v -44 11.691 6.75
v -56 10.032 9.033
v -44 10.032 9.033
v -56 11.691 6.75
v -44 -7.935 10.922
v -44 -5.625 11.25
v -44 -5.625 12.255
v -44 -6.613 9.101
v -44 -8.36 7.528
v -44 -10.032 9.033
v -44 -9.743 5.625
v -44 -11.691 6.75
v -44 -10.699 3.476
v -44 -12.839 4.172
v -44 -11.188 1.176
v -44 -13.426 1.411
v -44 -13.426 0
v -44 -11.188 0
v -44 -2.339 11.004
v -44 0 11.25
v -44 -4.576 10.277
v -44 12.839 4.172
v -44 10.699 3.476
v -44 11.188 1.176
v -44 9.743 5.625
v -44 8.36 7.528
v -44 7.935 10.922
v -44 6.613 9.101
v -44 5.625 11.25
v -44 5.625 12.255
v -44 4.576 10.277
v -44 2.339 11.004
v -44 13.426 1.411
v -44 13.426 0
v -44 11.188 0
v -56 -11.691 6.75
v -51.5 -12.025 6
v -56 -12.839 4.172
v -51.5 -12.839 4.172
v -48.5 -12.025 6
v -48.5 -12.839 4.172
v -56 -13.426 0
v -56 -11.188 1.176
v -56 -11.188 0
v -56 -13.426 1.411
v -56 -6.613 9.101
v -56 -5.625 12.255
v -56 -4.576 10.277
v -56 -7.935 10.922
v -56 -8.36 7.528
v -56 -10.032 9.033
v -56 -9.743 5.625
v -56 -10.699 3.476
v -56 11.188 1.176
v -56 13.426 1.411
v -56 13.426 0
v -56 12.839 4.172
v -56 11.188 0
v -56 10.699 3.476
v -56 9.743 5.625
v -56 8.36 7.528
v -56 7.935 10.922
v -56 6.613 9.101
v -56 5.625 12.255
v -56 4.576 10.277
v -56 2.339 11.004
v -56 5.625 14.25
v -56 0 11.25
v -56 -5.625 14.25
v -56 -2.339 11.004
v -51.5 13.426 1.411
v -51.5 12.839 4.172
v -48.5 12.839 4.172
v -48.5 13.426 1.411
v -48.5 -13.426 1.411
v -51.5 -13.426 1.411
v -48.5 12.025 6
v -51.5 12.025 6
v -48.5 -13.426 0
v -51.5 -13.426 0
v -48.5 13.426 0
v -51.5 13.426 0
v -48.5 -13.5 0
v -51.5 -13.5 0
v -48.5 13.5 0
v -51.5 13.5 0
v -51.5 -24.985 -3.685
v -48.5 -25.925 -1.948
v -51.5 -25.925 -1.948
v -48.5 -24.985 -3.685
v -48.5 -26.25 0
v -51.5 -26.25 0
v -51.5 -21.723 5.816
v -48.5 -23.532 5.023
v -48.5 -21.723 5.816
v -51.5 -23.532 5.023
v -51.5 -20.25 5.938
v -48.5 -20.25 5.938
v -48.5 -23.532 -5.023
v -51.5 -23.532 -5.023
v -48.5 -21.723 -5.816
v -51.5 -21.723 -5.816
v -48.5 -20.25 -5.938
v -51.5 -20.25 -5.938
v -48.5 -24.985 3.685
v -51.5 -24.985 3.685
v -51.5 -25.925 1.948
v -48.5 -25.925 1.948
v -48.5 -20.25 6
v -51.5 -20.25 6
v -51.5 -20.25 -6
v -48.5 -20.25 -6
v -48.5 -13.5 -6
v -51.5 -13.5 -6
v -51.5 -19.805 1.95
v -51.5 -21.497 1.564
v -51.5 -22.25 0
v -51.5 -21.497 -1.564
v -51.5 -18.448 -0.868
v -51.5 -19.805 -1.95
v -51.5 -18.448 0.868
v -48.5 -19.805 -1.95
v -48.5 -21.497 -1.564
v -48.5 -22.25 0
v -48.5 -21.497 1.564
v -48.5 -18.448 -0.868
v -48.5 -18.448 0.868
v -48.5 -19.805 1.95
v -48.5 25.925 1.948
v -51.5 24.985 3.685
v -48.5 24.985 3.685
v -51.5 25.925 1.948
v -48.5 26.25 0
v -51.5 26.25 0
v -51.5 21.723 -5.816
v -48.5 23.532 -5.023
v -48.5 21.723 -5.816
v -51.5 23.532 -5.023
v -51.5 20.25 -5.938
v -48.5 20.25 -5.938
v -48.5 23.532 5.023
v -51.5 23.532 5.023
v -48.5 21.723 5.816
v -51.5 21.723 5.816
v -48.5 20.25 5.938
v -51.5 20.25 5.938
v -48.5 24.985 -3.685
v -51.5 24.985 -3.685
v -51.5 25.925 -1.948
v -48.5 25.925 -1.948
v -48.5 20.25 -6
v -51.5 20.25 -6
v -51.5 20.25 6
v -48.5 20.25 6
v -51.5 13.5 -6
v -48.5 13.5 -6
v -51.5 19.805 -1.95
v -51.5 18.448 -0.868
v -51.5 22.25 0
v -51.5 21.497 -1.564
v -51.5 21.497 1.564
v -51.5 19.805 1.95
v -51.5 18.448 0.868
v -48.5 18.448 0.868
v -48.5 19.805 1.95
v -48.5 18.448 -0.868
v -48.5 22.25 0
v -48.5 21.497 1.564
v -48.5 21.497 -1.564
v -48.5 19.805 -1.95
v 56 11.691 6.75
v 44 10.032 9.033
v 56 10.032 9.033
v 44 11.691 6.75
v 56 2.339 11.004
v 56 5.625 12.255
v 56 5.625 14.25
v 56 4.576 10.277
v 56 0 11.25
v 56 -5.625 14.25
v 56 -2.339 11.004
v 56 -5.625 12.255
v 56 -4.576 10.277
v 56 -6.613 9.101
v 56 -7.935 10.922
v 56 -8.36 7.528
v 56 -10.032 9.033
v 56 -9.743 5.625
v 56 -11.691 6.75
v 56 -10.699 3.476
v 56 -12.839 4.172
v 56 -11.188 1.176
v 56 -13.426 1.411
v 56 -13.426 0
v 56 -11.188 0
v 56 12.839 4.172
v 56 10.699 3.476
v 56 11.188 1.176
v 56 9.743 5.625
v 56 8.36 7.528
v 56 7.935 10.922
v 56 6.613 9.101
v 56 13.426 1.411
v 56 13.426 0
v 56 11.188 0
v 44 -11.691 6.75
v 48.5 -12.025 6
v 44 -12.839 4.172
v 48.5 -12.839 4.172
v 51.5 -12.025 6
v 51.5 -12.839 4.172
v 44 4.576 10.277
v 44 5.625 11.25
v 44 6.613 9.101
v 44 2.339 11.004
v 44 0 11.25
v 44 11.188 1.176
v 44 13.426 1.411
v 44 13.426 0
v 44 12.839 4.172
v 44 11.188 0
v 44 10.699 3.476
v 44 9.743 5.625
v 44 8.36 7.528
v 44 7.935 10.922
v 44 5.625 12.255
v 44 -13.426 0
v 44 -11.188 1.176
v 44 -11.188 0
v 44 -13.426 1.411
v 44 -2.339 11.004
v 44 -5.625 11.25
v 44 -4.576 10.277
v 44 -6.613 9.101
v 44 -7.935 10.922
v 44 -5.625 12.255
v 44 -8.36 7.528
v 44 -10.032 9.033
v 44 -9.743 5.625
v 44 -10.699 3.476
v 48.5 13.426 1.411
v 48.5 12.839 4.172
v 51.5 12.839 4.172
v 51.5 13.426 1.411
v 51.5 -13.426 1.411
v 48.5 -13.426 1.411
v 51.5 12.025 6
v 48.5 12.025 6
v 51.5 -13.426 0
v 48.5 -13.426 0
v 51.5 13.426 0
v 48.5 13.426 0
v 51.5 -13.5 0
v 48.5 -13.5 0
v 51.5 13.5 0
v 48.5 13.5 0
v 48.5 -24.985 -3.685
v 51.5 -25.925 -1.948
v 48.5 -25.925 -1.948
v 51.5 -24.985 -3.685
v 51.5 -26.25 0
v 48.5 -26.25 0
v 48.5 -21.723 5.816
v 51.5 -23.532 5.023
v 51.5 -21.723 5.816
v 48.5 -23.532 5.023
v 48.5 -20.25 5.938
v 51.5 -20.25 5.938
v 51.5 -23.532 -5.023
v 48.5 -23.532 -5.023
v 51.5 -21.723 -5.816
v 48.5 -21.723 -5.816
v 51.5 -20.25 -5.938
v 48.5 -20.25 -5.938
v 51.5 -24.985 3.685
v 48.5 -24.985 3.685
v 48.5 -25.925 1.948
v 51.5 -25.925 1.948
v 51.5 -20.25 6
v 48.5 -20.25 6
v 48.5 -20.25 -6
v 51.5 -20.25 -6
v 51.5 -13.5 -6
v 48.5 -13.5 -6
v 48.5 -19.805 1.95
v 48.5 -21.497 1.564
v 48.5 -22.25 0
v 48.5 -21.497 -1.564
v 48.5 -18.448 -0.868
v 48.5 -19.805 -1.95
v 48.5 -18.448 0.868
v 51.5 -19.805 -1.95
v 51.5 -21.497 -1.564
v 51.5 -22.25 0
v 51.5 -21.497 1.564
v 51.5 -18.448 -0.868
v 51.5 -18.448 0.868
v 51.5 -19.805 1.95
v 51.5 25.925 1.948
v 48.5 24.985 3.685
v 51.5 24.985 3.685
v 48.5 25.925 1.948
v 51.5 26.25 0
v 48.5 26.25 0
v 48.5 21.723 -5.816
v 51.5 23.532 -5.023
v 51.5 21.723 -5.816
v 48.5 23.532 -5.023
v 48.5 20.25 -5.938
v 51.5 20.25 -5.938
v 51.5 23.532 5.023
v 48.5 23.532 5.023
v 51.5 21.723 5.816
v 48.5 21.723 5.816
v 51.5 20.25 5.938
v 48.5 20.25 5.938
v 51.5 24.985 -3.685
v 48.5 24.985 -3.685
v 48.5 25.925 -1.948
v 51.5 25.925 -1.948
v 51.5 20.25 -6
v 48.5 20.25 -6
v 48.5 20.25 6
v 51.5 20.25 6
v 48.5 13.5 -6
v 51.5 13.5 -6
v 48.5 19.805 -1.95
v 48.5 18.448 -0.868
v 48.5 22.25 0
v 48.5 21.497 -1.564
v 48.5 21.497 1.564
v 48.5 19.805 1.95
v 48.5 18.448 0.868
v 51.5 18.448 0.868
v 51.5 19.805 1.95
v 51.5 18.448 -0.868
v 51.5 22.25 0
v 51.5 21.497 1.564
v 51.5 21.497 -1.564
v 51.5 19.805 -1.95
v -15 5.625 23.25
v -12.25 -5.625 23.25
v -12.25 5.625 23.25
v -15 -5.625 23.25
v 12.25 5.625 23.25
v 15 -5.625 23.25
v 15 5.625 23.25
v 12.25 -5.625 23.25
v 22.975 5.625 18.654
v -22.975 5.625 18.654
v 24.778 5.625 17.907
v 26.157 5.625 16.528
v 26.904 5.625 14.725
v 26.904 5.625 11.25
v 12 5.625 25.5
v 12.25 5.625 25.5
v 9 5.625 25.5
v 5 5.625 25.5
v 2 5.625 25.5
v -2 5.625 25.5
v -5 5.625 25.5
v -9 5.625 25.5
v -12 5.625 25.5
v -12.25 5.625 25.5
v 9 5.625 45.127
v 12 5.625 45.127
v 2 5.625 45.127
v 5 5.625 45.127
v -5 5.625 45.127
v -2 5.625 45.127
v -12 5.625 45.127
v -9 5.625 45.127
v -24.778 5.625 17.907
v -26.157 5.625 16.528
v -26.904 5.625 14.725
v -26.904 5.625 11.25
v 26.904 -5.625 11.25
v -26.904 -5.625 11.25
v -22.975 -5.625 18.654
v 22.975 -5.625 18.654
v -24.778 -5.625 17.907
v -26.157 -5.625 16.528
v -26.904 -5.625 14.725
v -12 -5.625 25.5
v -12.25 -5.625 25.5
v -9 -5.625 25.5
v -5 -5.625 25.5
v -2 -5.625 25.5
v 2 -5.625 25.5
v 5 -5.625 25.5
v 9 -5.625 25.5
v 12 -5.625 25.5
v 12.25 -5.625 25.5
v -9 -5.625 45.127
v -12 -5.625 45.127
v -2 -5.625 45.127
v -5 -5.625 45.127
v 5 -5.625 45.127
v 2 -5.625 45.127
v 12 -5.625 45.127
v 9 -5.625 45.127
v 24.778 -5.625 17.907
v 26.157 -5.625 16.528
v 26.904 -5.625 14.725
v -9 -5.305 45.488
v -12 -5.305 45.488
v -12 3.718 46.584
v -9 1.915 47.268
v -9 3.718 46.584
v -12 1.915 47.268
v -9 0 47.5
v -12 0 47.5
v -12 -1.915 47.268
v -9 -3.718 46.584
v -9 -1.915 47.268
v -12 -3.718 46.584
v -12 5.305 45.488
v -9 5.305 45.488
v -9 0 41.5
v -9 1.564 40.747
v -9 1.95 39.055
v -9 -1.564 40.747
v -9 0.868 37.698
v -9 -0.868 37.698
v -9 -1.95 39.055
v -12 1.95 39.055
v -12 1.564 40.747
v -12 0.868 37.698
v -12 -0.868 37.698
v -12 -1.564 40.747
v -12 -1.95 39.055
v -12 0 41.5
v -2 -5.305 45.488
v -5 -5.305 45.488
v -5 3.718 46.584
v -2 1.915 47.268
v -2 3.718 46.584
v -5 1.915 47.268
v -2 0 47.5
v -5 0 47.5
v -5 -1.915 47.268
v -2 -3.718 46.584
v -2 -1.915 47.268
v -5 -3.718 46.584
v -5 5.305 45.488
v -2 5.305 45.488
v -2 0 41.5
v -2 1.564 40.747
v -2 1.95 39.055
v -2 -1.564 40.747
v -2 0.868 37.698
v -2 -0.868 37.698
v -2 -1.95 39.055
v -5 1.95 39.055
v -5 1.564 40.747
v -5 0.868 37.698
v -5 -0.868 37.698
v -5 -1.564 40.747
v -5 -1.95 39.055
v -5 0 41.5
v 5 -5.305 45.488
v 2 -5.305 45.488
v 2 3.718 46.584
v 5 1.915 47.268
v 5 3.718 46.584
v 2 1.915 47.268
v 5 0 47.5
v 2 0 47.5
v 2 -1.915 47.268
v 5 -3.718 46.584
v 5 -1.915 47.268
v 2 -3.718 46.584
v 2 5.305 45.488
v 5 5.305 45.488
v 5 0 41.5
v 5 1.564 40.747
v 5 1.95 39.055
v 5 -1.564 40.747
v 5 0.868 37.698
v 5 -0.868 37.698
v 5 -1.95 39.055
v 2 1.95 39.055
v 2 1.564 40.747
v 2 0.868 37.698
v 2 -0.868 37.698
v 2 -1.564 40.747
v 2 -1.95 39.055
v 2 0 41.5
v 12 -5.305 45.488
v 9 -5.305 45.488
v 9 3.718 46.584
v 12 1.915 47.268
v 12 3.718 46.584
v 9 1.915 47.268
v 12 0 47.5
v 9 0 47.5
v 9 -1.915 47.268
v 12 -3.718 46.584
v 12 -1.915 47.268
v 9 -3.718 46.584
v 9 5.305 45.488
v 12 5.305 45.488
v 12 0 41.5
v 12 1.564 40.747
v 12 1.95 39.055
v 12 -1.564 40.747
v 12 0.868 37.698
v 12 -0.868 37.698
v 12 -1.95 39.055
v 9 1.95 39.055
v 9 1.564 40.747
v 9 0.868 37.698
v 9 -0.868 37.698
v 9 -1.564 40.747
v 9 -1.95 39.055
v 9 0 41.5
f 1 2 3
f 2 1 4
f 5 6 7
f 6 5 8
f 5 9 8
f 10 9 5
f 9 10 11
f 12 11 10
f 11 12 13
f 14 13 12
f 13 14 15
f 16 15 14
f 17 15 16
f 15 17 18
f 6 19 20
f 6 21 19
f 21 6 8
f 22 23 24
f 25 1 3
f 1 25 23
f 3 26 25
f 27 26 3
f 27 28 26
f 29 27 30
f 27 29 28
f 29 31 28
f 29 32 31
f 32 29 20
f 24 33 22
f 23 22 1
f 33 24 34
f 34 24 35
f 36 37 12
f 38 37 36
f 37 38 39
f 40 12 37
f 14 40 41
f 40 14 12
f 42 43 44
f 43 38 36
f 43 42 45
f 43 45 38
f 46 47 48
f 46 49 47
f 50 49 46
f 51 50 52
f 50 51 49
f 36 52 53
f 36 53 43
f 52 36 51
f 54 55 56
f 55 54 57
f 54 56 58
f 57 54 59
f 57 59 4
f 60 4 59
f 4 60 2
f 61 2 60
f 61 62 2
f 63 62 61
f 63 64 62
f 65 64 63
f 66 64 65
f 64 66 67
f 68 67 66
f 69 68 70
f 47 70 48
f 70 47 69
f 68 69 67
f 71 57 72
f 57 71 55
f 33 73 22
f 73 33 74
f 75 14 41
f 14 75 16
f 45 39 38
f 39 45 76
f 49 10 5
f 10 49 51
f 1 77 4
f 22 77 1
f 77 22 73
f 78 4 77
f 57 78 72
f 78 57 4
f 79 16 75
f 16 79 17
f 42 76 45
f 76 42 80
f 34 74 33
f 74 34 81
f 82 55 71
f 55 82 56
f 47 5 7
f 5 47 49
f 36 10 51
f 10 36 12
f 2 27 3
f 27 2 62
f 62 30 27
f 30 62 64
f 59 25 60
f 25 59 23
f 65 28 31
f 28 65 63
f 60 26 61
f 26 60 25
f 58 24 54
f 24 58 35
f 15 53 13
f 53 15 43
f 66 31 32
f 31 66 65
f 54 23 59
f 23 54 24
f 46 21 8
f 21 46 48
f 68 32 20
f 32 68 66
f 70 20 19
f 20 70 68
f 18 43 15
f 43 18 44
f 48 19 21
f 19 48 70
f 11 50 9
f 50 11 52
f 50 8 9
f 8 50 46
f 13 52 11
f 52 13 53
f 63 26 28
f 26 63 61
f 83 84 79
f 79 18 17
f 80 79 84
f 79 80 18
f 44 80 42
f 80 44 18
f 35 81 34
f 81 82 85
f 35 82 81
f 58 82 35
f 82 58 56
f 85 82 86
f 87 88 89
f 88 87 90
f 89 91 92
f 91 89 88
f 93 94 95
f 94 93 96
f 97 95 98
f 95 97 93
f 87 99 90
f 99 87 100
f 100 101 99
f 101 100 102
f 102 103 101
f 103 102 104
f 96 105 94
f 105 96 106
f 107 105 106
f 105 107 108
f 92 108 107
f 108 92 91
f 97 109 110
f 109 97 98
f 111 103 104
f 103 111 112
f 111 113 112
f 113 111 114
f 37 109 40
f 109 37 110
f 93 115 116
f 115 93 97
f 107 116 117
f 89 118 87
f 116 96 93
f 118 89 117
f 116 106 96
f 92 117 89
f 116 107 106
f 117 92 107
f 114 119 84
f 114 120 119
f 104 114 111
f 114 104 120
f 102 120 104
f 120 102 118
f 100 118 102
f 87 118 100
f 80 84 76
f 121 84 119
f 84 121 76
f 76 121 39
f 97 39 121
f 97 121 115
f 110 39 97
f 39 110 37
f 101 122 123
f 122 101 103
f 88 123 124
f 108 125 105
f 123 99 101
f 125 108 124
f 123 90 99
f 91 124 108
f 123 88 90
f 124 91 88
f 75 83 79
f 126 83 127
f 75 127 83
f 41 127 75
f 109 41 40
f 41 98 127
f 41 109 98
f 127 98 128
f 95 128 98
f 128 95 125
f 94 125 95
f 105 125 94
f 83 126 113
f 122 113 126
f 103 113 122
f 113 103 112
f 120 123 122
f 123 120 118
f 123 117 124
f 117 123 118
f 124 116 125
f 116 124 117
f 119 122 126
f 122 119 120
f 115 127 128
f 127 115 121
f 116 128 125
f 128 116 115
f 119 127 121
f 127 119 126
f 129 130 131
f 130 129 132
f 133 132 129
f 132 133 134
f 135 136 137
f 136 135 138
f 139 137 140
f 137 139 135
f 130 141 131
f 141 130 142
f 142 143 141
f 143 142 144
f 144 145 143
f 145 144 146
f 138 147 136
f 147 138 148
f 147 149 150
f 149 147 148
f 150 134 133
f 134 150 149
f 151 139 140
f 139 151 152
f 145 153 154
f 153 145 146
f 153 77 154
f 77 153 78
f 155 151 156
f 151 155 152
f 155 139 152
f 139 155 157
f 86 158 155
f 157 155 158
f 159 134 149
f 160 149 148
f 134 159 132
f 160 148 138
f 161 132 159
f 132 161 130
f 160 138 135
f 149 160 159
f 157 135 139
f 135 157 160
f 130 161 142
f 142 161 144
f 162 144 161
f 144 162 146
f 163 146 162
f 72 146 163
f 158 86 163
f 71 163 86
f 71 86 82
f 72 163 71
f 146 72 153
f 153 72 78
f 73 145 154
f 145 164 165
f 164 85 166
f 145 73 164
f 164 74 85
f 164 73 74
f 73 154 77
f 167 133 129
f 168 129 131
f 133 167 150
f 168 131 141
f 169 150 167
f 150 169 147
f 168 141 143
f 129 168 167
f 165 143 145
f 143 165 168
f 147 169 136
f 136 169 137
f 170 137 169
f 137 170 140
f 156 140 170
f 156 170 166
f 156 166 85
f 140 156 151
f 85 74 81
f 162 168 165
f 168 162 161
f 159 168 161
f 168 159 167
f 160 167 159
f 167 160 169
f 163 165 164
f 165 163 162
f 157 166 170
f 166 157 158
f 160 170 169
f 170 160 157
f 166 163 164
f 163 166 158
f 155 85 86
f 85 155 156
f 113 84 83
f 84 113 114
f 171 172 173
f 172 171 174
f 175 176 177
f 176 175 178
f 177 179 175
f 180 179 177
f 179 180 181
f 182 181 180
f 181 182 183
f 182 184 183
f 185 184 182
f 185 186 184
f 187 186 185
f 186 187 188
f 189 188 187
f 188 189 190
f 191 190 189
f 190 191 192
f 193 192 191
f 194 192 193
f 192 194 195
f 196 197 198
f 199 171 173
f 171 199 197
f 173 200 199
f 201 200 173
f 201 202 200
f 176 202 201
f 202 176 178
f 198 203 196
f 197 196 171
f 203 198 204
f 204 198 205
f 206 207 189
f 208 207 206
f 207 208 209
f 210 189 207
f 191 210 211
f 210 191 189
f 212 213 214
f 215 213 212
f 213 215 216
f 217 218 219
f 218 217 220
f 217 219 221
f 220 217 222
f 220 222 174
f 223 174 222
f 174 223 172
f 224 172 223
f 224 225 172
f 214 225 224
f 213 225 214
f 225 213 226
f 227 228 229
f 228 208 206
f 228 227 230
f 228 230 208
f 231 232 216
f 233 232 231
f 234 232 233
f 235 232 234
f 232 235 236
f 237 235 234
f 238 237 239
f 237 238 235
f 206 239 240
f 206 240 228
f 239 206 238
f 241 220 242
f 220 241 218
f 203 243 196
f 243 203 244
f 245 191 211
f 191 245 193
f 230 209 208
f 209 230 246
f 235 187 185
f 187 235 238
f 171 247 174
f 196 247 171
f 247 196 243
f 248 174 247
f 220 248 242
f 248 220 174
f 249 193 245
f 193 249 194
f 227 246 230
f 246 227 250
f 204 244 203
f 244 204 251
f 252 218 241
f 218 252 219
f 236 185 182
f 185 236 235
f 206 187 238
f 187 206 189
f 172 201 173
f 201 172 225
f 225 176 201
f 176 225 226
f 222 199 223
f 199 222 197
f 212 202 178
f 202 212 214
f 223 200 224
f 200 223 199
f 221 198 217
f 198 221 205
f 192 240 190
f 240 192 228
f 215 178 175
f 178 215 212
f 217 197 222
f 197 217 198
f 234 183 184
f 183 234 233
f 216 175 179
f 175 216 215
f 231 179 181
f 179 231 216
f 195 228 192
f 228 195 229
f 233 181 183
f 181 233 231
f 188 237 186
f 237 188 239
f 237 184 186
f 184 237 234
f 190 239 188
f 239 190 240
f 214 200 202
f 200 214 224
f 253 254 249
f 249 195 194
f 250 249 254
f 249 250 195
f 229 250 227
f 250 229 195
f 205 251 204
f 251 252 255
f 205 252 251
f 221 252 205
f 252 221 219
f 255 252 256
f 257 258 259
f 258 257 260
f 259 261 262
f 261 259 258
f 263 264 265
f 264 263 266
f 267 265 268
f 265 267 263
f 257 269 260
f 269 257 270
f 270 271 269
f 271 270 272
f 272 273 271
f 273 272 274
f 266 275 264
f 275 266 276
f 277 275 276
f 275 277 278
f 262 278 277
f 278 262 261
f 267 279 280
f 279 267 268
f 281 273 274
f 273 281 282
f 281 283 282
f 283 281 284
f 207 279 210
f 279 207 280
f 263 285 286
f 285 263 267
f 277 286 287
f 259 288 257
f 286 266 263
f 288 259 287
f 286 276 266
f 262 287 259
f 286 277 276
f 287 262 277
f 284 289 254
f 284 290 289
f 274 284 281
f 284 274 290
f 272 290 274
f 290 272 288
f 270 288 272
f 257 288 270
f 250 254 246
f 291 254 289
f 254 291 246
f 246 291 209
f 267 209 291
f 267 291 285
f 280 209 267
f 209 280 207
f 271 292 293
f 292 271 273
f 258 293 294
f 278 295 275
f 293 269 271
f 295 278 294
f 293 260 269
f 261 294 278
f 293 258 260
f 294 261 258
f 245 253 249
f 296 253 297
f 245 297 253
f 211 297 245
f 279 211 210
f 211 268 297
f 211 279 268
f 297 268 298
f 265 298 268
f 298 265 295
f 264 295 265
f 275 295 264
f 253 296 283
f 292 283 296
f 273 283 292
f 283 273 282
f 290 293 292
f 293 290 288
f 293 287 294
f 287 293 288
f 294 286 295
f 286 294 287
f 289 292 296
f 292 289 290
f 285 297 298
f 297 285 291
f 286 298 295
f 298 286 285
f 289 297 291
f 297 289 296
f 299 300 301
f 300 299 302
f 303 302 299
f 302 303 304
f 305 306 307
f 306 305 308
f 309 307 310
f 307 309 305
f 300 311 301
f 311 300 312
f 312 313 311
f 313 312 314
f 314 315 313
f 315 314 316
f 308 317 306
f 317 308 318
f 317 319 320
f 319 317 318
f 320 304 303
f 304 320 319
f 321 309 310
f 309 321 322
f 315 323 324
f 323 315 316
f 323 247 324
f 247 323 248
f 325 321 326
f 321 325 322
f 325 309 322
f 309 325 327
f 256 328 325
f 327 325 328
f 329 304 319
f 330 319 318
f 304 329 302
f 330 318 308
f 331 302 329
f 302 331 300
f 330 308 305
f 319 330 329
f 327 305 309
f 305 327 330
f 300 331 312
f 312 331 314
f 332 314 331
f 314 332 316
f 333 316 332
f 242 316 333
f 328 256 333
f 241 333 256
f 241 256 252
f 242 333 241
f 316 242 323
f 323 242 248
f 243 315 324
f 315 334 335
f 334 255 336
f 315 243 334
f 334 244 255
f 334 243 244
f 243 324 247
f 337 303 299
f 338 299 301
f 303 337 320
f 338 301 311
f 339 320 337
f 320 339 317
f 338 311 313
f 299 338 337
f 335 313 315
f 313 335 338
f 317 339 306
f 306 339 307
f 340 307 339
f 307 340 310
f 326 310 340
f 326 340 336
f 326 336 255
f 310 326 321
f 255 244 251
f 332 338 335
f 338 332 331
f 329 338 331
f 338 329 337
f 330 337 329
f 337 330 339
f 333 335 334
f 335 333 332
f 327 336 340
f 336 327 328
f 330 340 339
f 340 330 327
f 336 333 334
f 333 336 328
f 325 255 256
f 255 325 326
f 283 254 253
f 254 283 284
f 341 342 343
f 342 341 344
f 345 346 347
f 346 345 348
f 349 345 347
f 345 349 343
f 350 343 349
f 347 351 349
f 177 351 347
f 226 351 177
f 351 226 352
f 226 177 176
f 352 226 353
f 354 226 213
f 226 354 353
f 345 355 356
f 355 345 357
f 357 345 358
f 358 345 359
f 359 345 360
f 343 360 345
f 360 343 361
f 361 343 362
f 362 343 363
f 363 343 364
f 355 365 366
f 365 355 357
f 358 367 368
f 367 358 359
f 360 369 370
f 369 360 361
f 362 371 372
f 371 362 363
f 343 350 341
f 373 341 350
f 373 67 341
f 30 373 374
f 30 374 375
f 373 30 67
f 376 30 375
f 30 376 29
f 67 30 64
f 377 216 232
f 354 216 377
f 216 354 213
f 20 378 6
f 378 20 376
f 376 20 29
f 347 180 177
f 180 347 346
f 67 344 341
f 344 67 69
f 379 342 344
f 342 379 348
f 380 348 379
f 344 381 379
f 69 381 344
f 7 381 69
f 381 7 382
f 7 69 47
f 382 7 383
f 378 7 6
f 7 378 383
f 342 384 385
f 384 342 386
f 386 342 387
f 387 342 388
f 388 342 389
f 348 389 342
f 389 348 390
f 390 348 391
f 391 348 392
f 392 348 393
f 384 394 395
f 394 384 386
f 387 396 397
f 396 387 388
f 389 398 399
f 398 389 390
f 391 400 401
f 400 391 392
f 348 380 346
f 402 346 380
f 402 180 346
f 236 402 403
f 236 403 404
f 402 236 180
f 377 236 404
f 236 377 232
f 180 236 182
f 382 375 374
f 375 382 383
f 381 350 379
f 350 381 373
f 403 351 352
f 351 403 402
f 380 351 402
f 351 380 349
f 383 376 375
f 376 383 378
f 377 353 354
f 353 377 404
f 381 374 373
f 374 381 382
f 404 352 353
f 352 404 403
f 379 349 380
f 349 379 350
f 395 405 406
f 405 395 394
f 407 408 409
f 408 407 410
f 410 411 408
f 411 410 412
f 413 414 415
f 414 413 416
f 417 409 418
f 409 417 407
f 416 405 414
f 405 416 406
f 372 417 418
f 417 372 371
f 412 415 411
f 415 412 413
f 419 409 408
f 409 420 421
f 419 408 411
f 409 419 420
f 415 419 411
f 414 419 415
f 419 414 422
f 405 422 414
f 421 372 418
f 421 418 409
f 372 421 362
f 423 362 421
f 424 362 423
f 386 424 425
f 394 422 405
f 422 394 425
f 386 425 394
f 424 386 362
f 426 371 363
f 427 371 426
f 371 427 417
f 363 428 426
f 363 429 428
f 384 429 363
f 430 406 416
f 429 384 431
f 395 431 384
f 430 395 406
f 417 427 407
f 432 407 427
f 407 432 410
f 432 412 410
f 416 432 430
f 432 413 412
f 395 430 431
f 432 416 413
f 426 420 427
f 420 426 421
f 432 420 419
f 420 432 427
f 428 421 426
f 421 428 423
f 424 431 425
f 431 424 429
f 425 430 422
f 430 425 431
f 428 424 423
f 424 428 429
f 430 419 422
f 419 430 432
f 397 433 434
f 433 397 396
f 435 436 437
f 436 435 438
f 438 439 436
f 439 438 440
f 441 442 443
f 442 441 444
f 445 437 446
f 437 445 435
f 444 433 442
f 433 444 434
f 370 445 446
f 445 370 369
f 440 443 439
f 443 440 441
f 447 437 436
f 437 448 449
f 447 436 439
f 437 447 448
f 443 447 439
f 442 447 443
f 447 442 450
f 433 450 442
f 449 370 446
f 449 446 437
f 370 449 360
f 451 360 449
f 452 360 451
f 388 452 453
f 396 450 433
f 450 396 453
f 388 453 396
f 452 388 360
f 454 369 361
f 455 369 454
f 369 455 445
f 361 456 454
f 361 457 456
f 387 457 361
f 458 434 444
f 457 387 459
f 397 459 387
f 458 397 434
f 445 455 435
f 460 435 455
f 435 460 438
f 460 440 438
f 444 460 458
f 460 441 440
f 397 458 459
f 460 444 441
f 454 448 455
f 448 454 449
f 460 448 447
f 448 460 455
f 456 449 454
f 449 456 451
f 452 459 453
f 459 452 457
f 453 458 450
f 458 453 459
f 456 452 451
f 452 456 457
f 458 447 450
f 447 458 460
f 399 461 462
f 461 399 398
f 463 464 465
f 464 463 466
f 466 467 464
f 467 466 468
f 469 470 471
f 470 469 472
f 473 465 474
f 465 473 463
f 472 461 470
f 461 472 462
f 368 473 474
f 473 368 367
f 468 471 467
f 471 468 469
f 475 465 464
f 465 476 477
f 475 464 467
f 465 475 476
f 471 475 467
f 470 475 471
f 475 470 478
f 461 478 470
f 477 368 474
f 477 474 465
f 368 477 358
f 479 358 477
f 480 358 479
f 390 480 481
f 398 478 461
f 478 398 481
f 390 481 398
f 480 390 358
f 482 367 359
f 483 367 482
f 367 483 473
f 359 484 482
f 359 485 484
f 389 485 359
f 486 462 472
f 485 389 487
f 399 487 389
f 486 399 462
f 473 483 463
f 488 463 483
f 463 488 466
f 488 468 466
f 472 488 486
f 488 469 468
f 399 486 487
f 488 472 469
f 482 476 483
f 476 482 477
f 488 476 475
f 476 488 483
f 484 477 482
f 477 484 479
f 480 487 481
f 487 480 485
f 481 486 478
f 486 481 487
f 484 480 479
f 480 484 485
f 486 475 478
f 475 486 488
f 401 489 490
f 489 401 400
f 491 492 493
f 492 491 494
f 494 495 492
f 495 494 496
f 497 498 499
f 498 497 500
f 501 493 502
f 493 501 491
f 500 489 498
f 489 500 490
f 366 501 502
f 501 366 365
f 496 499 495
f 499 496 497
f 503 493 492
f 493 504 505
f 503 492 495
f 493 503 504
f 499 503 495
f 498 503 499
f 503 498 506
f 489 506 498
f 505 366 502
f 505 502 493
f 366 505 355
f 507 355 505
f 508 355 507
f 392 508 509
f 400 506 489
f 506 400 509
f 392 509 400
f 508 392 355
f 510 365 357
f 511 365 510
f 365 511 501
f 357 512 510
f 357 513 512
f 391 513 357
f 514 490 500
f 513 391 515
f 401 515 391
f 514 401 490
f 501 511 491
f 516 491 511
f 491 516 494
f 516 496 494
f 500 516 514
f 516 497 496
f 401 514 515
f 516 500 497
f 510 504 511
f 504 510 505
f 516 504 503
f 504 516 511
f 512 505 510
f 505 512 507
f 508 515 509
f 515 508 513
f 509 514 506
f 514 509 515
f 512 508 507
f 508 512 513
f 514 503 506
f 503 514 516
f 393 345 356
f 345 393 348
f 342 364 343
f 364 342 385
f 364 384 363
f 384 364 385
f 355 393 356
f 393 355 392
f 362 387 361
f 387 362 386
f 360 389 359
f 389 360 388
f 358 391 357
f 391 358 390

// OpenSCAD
// file: lib.scad
module hull_box(l,w,h,c, center=true)
{	
    translate([center ? 0 : l/2, center ? 0 : w/2, center ? 0 : h/2]) 
	hull() {
        translate([-l/2+c, -w/2+c, -h/2+c]) sphere(r=c);
        translate([ l/2-c, -w/2+c, -h/2+c]) sphere(r=c);
        translate([ l/2-c,  w/2-c, -h/2+c]) sphere(r=c);
        translate([-l/2+c,  w/2-c, -h/2+c]) sphere(r=c);
        translate([-l/2+c, -w/2+c,  h/2-c]) sphere(r=c);
        translate([ l/2-c, -w/2+c,  h/2-c]) sphere(r=c);
        translate([ l/2-c,  w/2-c,  h/2-c]) sphere(r=c);
        translate([-l/2+c,  w/2-c,  h/2-c]) sphere(r=c);
    }
}

module wedge(l,w,h1,h2) {
    hull() {
        translate([0,(l-h1)/2,0])
            rotate([0,90,0]) cylinder(d=h1, h=w, center=true);
        translate([0,-l*0.45,0])
            cube([w,l*0.1,h2], center=true);
    }
}

module hinge_unit(p,d,l,w,h) {
    difference() {
        intersection() {
            cube([l,w,h], center=true);
            union() {
                translate([p,0,0]) rotate([90,0,0]) cylinder(d=(l/2-p)*2,h=2*w, center=true);
                translate([-l/2,-w,-h/2]) cube([l/2+p,w*2,h]);
            }
        }
        translate([p,0,0]) rotate([90,0,0]) cylinder(d=d,h=2*w, center=true);
    }
}

module hinge_n(p,d,l,w,h,j=0.2, n=1, base_h=0) {
    translate([0,(l-base_h)/2,0])
        cube([(2*n-1)*(w+j),base_h,h], center=true);
	translate([-(n-1)*(w+j),0,0]) for (i = [0 : n-1] ) {
		translate([ 2*i*(w+j), 0, 0]) rotate([0,0,270]) hinge_unit(p,d,l,w,h);
	}
}

module hinge_lock(hd,hl,e,j=0.2, endlock=true) {
    cylinder(d=hd-j, h=hl, center=true);
    translate([-e,0,hl/2]) rotate([90,0,0]) rotate_extrude(angle=180)
       translate([e, 0, 0]) circle(d=hd-j);
    translate([-2*e,0,0]) rotate([0,0,0]) cylinder(d=hd-j, h=hl, center=true);
    translate([-e,0,-hl/2]) rotate([90,0,0]) rotate_extrude(angle=90)
       translate([-e, 0, 0]) circle(d=hd-j);
	if (endlock) {
		translate([-e/2,0,-hl/2-hd]) rotate([0,90,0]) cylinder(d=hd-j, h=hl/4, center=true);
	}
}

module grip(l, d, f=1.2, t=0.5, dg=0, dh=1, dfl=1, center=true) {
    difference() {
        hull() {
            cylinder(h=l, d=d*f, center=center);
            if (dg != 0) {
                translate([dg + (t>0 ? 1 : -1) * (center ? d/2 : 0), 0, 0])
#                    cylinder(h=l*dfl, d=dh, center=center);
            }
        }
        cylinder(h=l*1.1, d=d, center=center);
        translate([d*f*t, 0, 0])
            cube([d*f,d*f,l*1.1], center=center);
    }
}

module angle_hold(a,r,l,t,d, f=1.2, dt=0.67, fl=1, dg=0, dh=1, dfl=1) {
    difference() {
        rotate_extrude(angle=a)
            translate([r, 0, 0]) square([l,t], center=true);
        rotate([90,0,90-0.5])
            translate([0,0,r]) cylinder(h=l*f, d=d*f, center=true);
        rotate([90,0,90+a+0.5])
            translate([0,0,r]) cylinder(h=l*f, d=d*f, center=true);
    }
    rotate([90,0,90])
        translate([0,0,r*0.995]) grip(l=l*fl, d=d, f=f, t=-dt, dg=dg, dh=dh, dfl=dfl);
    rotate([90,0,90+a])
        translate([0,0,r*0.995]) grip(l=l*fl, d=d, f=f, t=dt, dg=-dg, dh=dh, dfl=dfl);
}

module tube_lock(hinge_p, hinge_d, hinge_l, hinge_w, hinge_h, grip_l, grip_d, n=1, flat=true, f_grip=1.2) {
    difference() {
        union() {
            grip(grip_l, grip_d, f_grip);
            translate([flat?-hinge_w/2:0,-(hinge_l+grip_d)/2,0]) 
                rotate([0, flat?0:90, 0])
                    hinge_n(hinge_p,hinge_d,hinge_l,hinge_w,hinge_h, n=n);
            translate([flat?-hinge_w/2:0,(hinge_l+grip_d)/2,0]) rotate([0,0,180])
                rotate([0, flat?0:90, 0])
                    hinge_n(hinge_p,hinge_d,hinge_l,hinge_w,hinge_h, n=n);
        }
        if(!flat) {
            translate([grip_d/2,0,0])
                cube([grip_d,grip_d*f_grip,grip_l], center=true);
        }
    }
}

module sphere_hold(d,e,j,d1,a1,d2,a2) {
    difference() {
        sphere(d=d+e);
        sphere(d=d+j);
        rotate([0,a1,0]) translate([d1,0,0])
#            cube([d+e+j,d+e+j,d+e+j], center=true);
        rotate([0,a2,0]) translate([d2,0,0])
#            cube([d+e+j,d+e+j,d+e+j], center=true);
    }
}

module sphere_magnet_hold(d,e,c,j,d1,a1,d2,a2) {
    difference() {
        sphere_hold(d,e,j,d1,a1,d2,a2);
        translate([-(d+c)/2,0,0])
#            cube([c+j,c+j,c+j], center=true);
    }
}

module sphere_hinge_hold(d,e,j,d1,a1,d2,a2,hp,hd,hl,hw,hh,hn=3,ah=0,av=0) {
	sphere_hold(d,e,j,d1,a1,d2,a2);
	rotate([0,ah,0]) 
		translate([-(d+hl)*0.49,0,0]) 
			rotate([0,av,-90])
				hinge_n(hp,hd,hl,hw,hh, n=hn, base_h=e*1.5);
}
// main file
include<lib.scad>

grip_l=12;
grip_d=22.5;
grip_delta=50;

portee=1.5;
vis=4;
hinge_l=15;
hinge_w=3;
hinge_h=12;


translate([-grip_delta,0,0]) rotate([0,90,0])
	tube_lock(portee, vis, hinge_l, hinge_w, hinge_h, grip_l, grip_d, 1, false);
translate([ grip_delta,0,0]) rotate([0,90,0])
	tube_lock(portee, vis, hinge_l, hinge_w, hinge_h, grip_l, grip_d, 1, false);

translate([-grip_delta,0,0]) rotate([0,90,0]) rotate([0,0,180])
%	tube_lock(portee, vis, hinge_l, hinge_w, hinge_h, grip_l, grip_d, 2, false);
translate([ grip_delta,0,0]) rotate([0,90,0]) rotate([0,0,180])
%	tube_lock(portee, vis, hinge_l, hinge_w, hinge_h, grip_l, grip_d, 2, false);

translate([0,0,(grip_d+hinge_w)/2]) difference() {
    hull() {
        cube([grip_delta*2+grip_l, grip_d/2, hinge_w], center=true);
        translate([0,0,hinge_w*3])
            cube([hinge_w*10, grip_d/2, hinge_w], center=true);
    }
    hull_box(hinge_w*18, grip_d, hinge_w*4, 5, center=true);
}
    


translate([0,0,35]) rotate([270,0,0])
    hinge_n(4.5,vis,25,hinge_w,grip_d/2,0.5,4,3);
